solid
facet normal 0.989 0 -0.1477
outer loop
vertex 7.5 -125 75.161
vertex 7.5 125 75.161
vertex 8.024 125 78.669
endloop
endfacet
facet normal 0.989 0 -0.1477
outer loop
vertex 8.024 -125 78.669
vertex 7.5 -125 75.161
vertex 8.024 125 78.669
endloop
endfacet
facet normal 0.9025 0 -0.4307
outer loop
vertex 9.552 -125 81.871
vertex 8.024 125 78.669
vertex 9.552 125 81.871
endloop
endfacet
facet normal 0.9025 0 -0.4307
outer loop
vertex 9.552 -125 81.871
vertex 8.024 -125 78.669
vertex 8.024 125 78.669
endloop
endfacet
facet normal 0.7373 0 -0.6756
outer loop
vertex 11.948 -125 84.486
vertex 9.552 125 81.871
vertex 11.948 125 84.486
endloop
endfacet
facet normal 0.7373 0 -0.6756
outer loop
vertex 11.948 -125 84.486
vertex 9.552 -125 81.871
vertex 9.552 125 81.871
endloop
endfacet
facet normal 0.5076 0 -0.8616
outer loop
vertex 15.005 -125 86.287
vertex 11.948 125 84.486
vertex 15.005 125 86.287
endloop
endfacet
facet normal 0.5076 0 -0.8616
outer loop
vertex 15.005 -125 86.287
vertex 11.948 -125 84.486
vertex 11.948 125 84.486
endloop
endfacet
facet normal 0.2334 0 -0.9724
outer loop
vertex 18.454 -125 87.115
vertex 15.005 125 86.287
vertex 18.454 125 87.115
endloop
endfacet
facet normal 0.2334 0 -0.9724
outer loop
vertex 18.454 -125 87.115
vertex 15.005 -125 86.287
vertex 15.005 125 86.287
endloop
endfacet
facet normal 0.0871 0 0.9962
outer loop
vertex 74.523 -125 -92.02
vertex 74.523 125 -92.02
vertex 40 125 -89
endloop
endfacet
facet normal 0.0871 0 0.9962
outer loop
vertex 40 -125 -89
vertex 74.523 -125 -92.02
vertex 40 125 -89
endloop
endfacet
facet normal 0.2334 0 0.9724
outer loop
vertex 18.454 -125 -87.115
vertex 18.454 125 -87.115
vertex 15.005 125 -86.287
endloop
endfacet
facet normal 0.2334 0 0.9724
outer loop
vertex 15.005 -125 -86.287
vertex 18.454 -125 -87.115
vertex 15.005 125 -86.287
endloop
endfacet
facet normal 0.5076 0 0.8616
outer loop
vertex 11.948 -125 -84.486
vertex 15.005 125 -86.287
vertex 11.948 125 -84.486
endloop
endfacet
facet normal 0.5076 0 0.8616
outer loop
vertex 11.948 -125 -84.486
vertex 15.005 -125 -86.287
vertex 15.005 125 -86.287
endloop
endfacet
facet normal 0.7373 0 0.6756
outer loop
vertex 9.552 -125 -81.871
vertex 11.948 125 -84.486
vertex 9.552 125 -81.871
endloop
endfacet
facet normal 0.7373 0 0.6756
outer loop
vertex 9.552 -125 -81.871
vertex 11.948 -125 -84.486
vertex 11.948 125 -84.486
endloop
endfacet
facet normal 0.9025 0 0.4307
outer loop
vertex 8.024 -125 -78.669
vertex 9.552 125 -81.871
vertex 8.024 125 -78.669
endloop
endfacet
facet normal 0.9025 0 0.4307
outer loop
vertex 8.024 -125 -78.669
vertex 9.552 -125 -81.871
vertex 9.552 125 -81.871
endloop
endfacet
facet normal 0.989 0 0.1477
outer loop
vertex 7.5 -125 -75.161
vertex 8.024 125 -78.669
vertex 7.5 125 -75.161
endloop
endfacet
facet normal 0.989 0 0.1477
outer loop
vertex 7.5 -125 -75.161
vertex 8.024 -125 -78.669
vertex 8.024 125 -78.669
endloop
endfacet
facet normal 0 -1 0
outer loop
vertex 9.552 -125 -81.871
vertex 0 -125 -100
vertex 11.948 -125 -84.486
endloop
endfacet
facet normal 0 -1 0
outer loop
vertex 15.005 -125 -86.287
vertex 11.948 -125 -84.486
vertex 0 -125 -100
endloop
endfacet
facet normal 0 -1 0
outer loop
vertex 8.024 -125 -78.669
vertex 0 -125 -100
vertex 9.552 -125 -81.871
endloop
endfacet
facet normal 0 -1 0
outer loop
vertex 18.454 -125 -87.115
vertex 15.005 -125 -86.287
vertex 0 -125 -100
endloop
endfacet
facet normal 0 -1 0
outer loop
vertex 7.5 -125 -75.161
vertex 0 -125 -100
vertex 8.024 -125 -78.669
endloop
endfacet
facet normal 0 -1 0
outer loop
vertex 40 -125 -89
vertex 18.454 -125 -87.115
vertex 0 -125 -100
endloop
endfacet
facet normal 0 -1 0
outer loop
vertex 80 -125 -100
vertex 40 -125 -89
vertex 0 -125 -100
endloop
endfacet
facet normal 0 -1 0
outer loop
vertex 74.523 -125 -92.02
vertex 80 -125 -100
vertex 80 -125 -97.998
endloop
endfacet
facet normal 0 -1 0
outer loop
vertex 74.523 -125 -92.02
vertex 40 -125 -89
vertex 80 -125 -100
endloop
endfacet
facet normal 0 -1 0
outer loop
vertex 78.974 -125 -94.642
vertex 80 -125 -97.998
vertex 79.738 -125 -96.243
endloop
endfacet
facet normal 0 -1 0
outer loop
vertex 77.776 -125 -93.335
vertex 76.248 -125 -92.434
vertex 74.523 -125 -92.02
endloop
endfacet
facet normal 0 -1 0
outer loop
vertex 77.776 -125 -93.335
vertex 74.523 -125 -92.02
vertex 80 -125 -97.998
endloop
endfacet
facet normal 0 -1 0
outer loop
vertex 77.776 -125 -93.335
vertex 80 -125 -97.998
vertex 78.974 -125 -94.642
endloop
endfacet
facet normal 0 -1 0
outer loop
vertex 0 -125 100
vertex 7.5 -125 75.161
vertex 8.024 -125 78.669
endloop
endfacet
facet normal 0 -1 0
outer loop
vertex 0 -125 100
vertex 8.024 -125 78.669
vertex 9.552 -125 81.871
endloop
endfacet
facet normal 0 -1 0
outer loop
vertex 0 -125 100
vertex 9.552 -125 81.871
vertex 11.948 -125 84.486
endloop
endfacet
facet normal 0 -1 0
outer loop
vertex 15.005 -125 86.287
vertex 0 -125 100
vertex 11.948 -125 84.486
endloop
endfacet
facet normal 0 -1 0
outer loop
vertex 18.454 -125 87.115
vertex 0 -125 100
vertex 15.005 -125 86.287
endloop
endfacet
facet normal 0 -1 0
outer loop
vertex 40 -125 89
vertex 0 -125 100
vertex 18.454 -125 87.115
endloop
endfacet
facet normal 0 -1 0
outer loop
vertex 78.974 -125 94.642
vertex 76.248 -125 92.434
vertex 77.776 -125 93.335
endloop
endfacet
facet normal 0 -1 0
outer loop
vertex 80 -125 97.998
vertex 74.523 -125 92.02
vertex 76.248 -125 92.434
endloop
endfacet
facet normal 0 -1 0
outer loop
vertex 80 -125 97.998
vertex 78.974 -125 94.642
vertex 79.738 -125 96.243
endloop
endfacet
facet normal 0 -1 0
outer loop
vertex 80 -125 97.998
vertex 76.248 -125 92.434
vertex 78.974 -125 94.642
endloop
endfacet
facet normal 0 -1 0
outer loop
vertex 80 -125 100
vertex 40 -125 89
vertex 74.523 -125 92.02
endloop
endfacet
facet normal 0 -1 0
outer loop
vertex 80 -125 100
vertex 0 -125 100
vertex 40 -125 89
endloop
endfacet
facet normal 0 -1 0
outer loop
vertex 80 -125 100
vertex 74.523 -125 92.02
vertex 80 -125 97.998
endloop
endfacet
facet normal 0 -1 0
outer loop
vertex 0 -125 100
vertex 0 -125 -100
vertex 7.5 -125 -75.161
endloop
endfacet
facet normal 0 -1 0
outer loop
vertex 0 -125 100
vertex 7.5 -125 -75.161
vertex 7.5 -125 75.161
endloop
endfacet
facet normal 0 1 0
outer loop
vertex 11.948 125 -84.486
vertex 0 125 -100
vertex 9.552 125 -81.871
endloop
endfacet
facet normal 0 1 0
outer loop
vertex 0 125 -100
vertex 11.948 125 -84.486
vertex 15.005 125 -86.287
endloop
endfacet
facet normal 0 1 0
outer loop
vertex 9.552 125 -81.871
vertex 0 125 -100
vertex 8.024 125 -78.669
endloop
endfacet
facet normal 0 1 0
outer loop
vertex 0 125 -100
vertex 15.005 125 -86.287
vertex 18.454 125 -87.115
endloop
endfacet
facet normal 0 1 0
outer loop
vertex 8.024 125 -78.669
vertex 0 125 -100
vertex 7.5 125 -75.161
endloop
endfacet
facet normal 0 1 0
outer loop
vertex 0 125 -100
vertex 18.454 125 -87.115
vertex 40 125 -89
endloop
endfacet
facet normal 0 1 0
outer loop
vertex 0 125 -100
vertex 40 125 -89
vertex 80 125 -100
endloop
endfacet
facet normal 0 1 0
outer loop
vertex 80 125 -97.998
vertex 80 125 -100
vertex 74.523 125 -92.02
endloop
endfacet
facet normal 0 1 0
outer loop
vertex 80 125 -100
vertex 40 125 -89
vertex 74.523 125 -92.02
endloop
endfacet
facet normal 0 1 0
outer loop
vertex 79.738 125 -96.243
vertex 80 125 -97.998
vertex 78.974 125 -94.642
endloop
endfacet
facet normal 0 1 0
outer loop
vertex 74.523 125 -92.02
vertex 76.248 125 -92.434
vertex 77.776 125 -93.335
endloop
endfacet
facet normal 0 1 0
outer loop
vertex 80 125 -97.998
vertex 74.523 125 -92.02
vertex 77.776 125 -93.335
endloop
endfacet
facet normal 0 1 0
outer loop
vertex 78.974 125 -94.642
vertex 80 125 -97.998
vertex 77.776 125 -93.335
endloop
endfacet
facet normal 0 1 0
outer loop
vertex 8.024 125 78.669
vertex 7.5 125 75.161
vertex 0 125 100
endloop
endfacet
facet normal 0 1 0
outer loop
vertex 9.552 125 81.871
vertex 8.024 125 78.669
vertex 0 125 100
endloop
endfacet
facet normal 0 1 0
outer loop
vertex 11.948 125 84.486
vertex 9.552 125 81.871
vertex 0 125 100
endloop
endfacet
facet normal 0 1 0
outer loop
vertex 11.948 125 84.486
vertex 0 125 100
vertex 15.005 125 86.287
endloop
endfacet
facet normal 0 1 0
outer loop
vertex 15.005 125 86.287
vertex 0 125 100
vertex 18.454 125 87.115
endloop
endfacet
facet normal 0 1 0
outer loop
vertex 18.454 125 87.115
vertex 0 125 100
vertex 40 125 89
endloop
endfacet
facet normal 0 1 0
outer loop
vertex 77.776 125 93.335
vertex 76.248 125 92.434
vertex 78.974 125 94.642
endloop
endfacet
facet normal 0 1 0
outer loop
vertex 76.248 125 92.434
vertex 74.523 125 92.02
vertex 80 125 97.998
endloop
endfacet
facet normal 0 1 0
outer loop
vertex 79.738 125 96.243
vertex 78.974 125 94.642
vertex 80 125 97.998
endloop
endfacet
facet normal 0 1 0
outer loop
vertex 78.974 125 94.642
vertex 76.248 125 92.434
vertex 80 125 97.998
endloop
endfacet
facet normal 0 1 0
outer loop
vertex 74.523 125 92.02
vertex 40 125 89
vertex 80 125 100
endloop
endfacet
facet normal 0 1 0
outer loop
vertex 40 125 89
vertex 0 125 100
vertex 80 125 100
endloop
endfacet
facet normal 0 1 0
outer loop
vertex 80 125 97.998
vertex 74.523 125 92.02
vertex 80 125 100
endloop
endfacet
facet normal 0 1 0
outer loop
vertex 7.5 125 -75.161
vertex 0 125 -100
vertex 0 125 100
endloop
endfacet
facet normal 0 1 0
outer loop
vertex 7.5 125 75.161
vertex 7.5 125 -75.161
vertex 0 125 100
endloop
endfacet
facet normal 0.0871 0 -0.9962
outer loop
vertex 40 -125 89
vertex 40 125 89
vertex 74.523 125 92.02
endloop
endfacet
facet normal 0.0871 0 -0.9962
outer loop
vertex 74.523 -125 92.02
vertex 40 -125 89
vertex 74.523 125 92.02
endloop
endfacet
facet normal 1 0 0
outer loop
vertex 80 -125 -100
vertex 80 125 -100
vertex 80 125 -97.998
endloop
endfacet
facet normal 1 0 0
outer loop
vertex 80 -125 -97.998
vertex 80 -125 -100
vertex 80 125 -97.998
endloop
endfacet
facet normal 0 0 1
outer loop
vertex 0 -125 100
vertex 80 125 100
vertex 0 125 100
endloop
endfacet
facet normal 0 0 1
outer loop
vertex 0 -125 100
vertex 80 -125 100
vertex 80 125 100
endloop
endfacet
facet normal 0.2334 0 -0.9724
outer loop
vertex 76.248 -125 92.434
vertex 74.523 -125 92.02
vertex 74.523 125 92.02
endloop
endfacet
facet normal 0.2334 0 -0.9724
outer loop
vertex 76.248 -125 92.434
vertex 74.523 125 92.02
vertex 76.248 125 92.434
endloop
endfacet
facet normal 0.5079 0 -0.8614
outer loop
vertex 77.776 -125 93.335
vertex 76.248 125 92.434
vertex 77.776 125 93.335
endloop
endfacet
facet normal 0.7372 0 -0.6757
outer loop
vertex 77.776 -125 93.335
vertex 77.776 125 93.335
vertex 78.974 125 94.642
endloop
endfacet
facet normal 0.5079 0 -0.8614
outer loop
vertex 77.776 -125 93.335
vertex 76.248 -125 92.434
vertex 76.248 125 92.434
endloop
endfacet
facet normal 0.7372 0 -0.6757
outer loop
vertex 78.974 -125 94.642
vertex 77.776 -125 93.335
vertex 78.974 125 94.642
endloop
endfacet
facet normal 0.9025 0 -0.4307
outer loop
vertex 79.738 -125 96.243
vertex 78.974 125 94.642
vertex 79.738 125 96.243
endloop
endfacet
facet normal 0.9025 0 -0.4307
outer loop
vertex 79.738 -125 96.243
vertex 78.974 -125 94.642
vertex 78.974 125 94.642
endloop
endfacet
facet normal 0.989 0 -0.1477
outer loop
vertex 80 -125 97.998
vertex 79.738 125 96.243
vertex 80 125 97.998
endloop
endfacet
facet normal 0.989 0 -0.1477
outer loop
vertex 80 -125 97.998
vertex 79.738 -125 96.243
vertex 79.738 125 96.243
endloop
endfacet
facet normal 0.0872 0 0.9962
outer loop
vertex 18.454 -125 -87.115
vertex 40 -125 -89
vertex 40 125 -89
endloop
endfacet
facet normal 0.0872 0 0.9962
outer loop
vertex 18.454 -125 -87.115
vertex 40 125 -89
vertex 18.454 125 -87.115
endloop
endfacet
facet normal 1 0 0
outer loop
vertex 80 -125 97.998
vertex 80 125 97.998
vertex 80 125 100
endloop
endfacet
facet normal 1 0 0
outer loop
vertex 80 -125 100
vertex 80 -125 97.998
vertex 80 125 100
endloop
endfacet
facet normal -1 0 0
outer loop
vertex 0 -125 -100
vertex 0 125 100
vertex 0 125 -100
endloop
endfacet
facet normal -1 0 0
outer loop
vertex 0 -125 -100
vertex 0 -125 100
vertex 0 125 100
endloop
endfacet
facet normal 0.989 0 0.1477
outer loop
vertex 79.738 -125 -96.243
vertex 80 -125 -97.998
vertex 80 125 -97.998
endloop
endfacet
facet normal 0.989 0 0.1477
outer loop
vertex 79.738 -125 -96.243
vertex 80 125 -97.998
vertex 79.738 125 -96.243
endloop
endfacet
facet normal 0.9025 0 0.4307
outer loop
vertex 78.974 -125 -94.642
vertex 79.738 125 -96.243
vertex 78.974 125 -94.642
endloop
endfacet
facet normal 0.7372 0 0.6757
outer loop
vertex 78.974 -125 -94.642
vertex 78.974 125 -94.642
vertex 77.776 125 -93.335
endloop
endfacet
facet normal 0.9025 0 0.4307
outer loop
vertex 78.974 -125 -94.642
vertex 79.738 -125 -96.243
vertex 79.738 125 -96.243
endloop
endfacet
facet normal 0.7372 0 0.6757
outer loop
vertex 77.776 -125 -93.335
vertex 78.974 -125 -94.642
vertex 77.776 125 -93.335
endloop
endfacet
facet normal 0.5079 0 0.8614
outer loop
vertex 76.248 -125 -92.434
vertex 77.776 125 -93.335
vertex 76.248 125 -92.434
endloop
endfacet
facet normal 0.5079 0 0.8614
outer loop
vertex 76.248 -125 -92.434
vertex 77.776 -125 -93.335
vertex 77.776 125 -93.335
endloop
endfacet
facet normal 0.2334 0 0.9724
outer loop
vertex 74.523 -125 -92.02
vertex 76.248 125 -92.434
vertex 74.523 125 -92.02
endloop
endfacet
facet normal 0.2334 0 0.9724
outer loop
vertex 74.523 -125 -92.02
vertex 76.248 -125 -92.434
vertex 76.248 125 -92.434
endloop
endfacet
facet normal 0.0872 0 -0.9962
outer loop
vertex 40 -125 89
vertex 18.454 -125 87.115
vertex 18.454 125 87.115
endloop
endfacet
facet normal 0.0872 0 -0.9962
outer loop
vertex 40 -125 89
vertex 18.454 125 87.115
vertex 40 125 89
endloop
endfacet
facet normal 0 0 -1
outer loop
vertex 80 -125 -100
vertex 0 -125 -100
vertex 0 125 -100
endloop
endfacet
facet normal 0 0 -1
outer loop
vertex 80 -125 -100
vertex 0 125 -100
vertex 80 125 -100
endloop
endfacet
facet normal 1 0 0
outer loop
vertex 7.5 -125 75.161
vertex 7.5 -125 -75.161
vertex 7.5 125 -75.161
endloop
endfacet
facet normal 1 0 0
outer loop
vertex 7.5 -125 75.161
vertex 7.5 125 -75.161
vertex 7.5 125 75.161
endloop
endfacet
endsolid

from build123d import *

# Parameters (mm, degrees)
F1_DEPTH = 125


with BuildPart() as f1:
    # F0 (on Front) → F1 (new body, symmetric)
    with BuildSketch(Plane.XZ):
        with BuildLine():
            Line((0, 100), (0, 0))
            Line((0, 0), (7.5, 0))
            Line((7.5, 0), (7.5, 75.160644))
            ThreePointArc((7.5, 75.160644), (10.652672, 83.267727), (18.454131, 87.114981))
            Line((18.454131, 87.114981), (40, 89))
            Line((40, 89), (40, 100))
            Line((40, 100), (0, 100))
        make_face()
        with BuildLine():
            Line((80, 100), (40, 100))
            Line((40, 100), (40, 89))
            Line((40, 89), (74.522934, 92.020365))
            ThreePointArc((74.522934, 92.020365), (78.423664, 93.943992), (80, 97.997534))
            Line((80, 97.997534), (80, 100))
        make_face()
        with BuildLine():
            Line((7.5, 0), (0, 0))
            Line((0, 0), (0, -100))
            Line((0, -100), (40, -100))
            Line((40, -100), (40, -89))
            Line((40, -89), (18.454131, -87.114981))
            ThreePointArc((18.454131, -87.114981), (10.652672, -83.267727), (7.5, -75.160644))
            Line((7.5, -75.160644), (7.5, 0))
        make_face()
        with BuildLine():
            Line((40, -89), (40, -100))
            Line((40, -100), (80, -100))
            Line((80, -100), (80, -97.997534))
            ThreePointArc((80, -97.997534), (78.423664, -93.943992), (74.522934, -92.020365))
            Line((74.522934, -92.020365), (40, -89))
        make_face()
    extrude(amount=F1_DEPTH, both=True)


solid = f1.part
